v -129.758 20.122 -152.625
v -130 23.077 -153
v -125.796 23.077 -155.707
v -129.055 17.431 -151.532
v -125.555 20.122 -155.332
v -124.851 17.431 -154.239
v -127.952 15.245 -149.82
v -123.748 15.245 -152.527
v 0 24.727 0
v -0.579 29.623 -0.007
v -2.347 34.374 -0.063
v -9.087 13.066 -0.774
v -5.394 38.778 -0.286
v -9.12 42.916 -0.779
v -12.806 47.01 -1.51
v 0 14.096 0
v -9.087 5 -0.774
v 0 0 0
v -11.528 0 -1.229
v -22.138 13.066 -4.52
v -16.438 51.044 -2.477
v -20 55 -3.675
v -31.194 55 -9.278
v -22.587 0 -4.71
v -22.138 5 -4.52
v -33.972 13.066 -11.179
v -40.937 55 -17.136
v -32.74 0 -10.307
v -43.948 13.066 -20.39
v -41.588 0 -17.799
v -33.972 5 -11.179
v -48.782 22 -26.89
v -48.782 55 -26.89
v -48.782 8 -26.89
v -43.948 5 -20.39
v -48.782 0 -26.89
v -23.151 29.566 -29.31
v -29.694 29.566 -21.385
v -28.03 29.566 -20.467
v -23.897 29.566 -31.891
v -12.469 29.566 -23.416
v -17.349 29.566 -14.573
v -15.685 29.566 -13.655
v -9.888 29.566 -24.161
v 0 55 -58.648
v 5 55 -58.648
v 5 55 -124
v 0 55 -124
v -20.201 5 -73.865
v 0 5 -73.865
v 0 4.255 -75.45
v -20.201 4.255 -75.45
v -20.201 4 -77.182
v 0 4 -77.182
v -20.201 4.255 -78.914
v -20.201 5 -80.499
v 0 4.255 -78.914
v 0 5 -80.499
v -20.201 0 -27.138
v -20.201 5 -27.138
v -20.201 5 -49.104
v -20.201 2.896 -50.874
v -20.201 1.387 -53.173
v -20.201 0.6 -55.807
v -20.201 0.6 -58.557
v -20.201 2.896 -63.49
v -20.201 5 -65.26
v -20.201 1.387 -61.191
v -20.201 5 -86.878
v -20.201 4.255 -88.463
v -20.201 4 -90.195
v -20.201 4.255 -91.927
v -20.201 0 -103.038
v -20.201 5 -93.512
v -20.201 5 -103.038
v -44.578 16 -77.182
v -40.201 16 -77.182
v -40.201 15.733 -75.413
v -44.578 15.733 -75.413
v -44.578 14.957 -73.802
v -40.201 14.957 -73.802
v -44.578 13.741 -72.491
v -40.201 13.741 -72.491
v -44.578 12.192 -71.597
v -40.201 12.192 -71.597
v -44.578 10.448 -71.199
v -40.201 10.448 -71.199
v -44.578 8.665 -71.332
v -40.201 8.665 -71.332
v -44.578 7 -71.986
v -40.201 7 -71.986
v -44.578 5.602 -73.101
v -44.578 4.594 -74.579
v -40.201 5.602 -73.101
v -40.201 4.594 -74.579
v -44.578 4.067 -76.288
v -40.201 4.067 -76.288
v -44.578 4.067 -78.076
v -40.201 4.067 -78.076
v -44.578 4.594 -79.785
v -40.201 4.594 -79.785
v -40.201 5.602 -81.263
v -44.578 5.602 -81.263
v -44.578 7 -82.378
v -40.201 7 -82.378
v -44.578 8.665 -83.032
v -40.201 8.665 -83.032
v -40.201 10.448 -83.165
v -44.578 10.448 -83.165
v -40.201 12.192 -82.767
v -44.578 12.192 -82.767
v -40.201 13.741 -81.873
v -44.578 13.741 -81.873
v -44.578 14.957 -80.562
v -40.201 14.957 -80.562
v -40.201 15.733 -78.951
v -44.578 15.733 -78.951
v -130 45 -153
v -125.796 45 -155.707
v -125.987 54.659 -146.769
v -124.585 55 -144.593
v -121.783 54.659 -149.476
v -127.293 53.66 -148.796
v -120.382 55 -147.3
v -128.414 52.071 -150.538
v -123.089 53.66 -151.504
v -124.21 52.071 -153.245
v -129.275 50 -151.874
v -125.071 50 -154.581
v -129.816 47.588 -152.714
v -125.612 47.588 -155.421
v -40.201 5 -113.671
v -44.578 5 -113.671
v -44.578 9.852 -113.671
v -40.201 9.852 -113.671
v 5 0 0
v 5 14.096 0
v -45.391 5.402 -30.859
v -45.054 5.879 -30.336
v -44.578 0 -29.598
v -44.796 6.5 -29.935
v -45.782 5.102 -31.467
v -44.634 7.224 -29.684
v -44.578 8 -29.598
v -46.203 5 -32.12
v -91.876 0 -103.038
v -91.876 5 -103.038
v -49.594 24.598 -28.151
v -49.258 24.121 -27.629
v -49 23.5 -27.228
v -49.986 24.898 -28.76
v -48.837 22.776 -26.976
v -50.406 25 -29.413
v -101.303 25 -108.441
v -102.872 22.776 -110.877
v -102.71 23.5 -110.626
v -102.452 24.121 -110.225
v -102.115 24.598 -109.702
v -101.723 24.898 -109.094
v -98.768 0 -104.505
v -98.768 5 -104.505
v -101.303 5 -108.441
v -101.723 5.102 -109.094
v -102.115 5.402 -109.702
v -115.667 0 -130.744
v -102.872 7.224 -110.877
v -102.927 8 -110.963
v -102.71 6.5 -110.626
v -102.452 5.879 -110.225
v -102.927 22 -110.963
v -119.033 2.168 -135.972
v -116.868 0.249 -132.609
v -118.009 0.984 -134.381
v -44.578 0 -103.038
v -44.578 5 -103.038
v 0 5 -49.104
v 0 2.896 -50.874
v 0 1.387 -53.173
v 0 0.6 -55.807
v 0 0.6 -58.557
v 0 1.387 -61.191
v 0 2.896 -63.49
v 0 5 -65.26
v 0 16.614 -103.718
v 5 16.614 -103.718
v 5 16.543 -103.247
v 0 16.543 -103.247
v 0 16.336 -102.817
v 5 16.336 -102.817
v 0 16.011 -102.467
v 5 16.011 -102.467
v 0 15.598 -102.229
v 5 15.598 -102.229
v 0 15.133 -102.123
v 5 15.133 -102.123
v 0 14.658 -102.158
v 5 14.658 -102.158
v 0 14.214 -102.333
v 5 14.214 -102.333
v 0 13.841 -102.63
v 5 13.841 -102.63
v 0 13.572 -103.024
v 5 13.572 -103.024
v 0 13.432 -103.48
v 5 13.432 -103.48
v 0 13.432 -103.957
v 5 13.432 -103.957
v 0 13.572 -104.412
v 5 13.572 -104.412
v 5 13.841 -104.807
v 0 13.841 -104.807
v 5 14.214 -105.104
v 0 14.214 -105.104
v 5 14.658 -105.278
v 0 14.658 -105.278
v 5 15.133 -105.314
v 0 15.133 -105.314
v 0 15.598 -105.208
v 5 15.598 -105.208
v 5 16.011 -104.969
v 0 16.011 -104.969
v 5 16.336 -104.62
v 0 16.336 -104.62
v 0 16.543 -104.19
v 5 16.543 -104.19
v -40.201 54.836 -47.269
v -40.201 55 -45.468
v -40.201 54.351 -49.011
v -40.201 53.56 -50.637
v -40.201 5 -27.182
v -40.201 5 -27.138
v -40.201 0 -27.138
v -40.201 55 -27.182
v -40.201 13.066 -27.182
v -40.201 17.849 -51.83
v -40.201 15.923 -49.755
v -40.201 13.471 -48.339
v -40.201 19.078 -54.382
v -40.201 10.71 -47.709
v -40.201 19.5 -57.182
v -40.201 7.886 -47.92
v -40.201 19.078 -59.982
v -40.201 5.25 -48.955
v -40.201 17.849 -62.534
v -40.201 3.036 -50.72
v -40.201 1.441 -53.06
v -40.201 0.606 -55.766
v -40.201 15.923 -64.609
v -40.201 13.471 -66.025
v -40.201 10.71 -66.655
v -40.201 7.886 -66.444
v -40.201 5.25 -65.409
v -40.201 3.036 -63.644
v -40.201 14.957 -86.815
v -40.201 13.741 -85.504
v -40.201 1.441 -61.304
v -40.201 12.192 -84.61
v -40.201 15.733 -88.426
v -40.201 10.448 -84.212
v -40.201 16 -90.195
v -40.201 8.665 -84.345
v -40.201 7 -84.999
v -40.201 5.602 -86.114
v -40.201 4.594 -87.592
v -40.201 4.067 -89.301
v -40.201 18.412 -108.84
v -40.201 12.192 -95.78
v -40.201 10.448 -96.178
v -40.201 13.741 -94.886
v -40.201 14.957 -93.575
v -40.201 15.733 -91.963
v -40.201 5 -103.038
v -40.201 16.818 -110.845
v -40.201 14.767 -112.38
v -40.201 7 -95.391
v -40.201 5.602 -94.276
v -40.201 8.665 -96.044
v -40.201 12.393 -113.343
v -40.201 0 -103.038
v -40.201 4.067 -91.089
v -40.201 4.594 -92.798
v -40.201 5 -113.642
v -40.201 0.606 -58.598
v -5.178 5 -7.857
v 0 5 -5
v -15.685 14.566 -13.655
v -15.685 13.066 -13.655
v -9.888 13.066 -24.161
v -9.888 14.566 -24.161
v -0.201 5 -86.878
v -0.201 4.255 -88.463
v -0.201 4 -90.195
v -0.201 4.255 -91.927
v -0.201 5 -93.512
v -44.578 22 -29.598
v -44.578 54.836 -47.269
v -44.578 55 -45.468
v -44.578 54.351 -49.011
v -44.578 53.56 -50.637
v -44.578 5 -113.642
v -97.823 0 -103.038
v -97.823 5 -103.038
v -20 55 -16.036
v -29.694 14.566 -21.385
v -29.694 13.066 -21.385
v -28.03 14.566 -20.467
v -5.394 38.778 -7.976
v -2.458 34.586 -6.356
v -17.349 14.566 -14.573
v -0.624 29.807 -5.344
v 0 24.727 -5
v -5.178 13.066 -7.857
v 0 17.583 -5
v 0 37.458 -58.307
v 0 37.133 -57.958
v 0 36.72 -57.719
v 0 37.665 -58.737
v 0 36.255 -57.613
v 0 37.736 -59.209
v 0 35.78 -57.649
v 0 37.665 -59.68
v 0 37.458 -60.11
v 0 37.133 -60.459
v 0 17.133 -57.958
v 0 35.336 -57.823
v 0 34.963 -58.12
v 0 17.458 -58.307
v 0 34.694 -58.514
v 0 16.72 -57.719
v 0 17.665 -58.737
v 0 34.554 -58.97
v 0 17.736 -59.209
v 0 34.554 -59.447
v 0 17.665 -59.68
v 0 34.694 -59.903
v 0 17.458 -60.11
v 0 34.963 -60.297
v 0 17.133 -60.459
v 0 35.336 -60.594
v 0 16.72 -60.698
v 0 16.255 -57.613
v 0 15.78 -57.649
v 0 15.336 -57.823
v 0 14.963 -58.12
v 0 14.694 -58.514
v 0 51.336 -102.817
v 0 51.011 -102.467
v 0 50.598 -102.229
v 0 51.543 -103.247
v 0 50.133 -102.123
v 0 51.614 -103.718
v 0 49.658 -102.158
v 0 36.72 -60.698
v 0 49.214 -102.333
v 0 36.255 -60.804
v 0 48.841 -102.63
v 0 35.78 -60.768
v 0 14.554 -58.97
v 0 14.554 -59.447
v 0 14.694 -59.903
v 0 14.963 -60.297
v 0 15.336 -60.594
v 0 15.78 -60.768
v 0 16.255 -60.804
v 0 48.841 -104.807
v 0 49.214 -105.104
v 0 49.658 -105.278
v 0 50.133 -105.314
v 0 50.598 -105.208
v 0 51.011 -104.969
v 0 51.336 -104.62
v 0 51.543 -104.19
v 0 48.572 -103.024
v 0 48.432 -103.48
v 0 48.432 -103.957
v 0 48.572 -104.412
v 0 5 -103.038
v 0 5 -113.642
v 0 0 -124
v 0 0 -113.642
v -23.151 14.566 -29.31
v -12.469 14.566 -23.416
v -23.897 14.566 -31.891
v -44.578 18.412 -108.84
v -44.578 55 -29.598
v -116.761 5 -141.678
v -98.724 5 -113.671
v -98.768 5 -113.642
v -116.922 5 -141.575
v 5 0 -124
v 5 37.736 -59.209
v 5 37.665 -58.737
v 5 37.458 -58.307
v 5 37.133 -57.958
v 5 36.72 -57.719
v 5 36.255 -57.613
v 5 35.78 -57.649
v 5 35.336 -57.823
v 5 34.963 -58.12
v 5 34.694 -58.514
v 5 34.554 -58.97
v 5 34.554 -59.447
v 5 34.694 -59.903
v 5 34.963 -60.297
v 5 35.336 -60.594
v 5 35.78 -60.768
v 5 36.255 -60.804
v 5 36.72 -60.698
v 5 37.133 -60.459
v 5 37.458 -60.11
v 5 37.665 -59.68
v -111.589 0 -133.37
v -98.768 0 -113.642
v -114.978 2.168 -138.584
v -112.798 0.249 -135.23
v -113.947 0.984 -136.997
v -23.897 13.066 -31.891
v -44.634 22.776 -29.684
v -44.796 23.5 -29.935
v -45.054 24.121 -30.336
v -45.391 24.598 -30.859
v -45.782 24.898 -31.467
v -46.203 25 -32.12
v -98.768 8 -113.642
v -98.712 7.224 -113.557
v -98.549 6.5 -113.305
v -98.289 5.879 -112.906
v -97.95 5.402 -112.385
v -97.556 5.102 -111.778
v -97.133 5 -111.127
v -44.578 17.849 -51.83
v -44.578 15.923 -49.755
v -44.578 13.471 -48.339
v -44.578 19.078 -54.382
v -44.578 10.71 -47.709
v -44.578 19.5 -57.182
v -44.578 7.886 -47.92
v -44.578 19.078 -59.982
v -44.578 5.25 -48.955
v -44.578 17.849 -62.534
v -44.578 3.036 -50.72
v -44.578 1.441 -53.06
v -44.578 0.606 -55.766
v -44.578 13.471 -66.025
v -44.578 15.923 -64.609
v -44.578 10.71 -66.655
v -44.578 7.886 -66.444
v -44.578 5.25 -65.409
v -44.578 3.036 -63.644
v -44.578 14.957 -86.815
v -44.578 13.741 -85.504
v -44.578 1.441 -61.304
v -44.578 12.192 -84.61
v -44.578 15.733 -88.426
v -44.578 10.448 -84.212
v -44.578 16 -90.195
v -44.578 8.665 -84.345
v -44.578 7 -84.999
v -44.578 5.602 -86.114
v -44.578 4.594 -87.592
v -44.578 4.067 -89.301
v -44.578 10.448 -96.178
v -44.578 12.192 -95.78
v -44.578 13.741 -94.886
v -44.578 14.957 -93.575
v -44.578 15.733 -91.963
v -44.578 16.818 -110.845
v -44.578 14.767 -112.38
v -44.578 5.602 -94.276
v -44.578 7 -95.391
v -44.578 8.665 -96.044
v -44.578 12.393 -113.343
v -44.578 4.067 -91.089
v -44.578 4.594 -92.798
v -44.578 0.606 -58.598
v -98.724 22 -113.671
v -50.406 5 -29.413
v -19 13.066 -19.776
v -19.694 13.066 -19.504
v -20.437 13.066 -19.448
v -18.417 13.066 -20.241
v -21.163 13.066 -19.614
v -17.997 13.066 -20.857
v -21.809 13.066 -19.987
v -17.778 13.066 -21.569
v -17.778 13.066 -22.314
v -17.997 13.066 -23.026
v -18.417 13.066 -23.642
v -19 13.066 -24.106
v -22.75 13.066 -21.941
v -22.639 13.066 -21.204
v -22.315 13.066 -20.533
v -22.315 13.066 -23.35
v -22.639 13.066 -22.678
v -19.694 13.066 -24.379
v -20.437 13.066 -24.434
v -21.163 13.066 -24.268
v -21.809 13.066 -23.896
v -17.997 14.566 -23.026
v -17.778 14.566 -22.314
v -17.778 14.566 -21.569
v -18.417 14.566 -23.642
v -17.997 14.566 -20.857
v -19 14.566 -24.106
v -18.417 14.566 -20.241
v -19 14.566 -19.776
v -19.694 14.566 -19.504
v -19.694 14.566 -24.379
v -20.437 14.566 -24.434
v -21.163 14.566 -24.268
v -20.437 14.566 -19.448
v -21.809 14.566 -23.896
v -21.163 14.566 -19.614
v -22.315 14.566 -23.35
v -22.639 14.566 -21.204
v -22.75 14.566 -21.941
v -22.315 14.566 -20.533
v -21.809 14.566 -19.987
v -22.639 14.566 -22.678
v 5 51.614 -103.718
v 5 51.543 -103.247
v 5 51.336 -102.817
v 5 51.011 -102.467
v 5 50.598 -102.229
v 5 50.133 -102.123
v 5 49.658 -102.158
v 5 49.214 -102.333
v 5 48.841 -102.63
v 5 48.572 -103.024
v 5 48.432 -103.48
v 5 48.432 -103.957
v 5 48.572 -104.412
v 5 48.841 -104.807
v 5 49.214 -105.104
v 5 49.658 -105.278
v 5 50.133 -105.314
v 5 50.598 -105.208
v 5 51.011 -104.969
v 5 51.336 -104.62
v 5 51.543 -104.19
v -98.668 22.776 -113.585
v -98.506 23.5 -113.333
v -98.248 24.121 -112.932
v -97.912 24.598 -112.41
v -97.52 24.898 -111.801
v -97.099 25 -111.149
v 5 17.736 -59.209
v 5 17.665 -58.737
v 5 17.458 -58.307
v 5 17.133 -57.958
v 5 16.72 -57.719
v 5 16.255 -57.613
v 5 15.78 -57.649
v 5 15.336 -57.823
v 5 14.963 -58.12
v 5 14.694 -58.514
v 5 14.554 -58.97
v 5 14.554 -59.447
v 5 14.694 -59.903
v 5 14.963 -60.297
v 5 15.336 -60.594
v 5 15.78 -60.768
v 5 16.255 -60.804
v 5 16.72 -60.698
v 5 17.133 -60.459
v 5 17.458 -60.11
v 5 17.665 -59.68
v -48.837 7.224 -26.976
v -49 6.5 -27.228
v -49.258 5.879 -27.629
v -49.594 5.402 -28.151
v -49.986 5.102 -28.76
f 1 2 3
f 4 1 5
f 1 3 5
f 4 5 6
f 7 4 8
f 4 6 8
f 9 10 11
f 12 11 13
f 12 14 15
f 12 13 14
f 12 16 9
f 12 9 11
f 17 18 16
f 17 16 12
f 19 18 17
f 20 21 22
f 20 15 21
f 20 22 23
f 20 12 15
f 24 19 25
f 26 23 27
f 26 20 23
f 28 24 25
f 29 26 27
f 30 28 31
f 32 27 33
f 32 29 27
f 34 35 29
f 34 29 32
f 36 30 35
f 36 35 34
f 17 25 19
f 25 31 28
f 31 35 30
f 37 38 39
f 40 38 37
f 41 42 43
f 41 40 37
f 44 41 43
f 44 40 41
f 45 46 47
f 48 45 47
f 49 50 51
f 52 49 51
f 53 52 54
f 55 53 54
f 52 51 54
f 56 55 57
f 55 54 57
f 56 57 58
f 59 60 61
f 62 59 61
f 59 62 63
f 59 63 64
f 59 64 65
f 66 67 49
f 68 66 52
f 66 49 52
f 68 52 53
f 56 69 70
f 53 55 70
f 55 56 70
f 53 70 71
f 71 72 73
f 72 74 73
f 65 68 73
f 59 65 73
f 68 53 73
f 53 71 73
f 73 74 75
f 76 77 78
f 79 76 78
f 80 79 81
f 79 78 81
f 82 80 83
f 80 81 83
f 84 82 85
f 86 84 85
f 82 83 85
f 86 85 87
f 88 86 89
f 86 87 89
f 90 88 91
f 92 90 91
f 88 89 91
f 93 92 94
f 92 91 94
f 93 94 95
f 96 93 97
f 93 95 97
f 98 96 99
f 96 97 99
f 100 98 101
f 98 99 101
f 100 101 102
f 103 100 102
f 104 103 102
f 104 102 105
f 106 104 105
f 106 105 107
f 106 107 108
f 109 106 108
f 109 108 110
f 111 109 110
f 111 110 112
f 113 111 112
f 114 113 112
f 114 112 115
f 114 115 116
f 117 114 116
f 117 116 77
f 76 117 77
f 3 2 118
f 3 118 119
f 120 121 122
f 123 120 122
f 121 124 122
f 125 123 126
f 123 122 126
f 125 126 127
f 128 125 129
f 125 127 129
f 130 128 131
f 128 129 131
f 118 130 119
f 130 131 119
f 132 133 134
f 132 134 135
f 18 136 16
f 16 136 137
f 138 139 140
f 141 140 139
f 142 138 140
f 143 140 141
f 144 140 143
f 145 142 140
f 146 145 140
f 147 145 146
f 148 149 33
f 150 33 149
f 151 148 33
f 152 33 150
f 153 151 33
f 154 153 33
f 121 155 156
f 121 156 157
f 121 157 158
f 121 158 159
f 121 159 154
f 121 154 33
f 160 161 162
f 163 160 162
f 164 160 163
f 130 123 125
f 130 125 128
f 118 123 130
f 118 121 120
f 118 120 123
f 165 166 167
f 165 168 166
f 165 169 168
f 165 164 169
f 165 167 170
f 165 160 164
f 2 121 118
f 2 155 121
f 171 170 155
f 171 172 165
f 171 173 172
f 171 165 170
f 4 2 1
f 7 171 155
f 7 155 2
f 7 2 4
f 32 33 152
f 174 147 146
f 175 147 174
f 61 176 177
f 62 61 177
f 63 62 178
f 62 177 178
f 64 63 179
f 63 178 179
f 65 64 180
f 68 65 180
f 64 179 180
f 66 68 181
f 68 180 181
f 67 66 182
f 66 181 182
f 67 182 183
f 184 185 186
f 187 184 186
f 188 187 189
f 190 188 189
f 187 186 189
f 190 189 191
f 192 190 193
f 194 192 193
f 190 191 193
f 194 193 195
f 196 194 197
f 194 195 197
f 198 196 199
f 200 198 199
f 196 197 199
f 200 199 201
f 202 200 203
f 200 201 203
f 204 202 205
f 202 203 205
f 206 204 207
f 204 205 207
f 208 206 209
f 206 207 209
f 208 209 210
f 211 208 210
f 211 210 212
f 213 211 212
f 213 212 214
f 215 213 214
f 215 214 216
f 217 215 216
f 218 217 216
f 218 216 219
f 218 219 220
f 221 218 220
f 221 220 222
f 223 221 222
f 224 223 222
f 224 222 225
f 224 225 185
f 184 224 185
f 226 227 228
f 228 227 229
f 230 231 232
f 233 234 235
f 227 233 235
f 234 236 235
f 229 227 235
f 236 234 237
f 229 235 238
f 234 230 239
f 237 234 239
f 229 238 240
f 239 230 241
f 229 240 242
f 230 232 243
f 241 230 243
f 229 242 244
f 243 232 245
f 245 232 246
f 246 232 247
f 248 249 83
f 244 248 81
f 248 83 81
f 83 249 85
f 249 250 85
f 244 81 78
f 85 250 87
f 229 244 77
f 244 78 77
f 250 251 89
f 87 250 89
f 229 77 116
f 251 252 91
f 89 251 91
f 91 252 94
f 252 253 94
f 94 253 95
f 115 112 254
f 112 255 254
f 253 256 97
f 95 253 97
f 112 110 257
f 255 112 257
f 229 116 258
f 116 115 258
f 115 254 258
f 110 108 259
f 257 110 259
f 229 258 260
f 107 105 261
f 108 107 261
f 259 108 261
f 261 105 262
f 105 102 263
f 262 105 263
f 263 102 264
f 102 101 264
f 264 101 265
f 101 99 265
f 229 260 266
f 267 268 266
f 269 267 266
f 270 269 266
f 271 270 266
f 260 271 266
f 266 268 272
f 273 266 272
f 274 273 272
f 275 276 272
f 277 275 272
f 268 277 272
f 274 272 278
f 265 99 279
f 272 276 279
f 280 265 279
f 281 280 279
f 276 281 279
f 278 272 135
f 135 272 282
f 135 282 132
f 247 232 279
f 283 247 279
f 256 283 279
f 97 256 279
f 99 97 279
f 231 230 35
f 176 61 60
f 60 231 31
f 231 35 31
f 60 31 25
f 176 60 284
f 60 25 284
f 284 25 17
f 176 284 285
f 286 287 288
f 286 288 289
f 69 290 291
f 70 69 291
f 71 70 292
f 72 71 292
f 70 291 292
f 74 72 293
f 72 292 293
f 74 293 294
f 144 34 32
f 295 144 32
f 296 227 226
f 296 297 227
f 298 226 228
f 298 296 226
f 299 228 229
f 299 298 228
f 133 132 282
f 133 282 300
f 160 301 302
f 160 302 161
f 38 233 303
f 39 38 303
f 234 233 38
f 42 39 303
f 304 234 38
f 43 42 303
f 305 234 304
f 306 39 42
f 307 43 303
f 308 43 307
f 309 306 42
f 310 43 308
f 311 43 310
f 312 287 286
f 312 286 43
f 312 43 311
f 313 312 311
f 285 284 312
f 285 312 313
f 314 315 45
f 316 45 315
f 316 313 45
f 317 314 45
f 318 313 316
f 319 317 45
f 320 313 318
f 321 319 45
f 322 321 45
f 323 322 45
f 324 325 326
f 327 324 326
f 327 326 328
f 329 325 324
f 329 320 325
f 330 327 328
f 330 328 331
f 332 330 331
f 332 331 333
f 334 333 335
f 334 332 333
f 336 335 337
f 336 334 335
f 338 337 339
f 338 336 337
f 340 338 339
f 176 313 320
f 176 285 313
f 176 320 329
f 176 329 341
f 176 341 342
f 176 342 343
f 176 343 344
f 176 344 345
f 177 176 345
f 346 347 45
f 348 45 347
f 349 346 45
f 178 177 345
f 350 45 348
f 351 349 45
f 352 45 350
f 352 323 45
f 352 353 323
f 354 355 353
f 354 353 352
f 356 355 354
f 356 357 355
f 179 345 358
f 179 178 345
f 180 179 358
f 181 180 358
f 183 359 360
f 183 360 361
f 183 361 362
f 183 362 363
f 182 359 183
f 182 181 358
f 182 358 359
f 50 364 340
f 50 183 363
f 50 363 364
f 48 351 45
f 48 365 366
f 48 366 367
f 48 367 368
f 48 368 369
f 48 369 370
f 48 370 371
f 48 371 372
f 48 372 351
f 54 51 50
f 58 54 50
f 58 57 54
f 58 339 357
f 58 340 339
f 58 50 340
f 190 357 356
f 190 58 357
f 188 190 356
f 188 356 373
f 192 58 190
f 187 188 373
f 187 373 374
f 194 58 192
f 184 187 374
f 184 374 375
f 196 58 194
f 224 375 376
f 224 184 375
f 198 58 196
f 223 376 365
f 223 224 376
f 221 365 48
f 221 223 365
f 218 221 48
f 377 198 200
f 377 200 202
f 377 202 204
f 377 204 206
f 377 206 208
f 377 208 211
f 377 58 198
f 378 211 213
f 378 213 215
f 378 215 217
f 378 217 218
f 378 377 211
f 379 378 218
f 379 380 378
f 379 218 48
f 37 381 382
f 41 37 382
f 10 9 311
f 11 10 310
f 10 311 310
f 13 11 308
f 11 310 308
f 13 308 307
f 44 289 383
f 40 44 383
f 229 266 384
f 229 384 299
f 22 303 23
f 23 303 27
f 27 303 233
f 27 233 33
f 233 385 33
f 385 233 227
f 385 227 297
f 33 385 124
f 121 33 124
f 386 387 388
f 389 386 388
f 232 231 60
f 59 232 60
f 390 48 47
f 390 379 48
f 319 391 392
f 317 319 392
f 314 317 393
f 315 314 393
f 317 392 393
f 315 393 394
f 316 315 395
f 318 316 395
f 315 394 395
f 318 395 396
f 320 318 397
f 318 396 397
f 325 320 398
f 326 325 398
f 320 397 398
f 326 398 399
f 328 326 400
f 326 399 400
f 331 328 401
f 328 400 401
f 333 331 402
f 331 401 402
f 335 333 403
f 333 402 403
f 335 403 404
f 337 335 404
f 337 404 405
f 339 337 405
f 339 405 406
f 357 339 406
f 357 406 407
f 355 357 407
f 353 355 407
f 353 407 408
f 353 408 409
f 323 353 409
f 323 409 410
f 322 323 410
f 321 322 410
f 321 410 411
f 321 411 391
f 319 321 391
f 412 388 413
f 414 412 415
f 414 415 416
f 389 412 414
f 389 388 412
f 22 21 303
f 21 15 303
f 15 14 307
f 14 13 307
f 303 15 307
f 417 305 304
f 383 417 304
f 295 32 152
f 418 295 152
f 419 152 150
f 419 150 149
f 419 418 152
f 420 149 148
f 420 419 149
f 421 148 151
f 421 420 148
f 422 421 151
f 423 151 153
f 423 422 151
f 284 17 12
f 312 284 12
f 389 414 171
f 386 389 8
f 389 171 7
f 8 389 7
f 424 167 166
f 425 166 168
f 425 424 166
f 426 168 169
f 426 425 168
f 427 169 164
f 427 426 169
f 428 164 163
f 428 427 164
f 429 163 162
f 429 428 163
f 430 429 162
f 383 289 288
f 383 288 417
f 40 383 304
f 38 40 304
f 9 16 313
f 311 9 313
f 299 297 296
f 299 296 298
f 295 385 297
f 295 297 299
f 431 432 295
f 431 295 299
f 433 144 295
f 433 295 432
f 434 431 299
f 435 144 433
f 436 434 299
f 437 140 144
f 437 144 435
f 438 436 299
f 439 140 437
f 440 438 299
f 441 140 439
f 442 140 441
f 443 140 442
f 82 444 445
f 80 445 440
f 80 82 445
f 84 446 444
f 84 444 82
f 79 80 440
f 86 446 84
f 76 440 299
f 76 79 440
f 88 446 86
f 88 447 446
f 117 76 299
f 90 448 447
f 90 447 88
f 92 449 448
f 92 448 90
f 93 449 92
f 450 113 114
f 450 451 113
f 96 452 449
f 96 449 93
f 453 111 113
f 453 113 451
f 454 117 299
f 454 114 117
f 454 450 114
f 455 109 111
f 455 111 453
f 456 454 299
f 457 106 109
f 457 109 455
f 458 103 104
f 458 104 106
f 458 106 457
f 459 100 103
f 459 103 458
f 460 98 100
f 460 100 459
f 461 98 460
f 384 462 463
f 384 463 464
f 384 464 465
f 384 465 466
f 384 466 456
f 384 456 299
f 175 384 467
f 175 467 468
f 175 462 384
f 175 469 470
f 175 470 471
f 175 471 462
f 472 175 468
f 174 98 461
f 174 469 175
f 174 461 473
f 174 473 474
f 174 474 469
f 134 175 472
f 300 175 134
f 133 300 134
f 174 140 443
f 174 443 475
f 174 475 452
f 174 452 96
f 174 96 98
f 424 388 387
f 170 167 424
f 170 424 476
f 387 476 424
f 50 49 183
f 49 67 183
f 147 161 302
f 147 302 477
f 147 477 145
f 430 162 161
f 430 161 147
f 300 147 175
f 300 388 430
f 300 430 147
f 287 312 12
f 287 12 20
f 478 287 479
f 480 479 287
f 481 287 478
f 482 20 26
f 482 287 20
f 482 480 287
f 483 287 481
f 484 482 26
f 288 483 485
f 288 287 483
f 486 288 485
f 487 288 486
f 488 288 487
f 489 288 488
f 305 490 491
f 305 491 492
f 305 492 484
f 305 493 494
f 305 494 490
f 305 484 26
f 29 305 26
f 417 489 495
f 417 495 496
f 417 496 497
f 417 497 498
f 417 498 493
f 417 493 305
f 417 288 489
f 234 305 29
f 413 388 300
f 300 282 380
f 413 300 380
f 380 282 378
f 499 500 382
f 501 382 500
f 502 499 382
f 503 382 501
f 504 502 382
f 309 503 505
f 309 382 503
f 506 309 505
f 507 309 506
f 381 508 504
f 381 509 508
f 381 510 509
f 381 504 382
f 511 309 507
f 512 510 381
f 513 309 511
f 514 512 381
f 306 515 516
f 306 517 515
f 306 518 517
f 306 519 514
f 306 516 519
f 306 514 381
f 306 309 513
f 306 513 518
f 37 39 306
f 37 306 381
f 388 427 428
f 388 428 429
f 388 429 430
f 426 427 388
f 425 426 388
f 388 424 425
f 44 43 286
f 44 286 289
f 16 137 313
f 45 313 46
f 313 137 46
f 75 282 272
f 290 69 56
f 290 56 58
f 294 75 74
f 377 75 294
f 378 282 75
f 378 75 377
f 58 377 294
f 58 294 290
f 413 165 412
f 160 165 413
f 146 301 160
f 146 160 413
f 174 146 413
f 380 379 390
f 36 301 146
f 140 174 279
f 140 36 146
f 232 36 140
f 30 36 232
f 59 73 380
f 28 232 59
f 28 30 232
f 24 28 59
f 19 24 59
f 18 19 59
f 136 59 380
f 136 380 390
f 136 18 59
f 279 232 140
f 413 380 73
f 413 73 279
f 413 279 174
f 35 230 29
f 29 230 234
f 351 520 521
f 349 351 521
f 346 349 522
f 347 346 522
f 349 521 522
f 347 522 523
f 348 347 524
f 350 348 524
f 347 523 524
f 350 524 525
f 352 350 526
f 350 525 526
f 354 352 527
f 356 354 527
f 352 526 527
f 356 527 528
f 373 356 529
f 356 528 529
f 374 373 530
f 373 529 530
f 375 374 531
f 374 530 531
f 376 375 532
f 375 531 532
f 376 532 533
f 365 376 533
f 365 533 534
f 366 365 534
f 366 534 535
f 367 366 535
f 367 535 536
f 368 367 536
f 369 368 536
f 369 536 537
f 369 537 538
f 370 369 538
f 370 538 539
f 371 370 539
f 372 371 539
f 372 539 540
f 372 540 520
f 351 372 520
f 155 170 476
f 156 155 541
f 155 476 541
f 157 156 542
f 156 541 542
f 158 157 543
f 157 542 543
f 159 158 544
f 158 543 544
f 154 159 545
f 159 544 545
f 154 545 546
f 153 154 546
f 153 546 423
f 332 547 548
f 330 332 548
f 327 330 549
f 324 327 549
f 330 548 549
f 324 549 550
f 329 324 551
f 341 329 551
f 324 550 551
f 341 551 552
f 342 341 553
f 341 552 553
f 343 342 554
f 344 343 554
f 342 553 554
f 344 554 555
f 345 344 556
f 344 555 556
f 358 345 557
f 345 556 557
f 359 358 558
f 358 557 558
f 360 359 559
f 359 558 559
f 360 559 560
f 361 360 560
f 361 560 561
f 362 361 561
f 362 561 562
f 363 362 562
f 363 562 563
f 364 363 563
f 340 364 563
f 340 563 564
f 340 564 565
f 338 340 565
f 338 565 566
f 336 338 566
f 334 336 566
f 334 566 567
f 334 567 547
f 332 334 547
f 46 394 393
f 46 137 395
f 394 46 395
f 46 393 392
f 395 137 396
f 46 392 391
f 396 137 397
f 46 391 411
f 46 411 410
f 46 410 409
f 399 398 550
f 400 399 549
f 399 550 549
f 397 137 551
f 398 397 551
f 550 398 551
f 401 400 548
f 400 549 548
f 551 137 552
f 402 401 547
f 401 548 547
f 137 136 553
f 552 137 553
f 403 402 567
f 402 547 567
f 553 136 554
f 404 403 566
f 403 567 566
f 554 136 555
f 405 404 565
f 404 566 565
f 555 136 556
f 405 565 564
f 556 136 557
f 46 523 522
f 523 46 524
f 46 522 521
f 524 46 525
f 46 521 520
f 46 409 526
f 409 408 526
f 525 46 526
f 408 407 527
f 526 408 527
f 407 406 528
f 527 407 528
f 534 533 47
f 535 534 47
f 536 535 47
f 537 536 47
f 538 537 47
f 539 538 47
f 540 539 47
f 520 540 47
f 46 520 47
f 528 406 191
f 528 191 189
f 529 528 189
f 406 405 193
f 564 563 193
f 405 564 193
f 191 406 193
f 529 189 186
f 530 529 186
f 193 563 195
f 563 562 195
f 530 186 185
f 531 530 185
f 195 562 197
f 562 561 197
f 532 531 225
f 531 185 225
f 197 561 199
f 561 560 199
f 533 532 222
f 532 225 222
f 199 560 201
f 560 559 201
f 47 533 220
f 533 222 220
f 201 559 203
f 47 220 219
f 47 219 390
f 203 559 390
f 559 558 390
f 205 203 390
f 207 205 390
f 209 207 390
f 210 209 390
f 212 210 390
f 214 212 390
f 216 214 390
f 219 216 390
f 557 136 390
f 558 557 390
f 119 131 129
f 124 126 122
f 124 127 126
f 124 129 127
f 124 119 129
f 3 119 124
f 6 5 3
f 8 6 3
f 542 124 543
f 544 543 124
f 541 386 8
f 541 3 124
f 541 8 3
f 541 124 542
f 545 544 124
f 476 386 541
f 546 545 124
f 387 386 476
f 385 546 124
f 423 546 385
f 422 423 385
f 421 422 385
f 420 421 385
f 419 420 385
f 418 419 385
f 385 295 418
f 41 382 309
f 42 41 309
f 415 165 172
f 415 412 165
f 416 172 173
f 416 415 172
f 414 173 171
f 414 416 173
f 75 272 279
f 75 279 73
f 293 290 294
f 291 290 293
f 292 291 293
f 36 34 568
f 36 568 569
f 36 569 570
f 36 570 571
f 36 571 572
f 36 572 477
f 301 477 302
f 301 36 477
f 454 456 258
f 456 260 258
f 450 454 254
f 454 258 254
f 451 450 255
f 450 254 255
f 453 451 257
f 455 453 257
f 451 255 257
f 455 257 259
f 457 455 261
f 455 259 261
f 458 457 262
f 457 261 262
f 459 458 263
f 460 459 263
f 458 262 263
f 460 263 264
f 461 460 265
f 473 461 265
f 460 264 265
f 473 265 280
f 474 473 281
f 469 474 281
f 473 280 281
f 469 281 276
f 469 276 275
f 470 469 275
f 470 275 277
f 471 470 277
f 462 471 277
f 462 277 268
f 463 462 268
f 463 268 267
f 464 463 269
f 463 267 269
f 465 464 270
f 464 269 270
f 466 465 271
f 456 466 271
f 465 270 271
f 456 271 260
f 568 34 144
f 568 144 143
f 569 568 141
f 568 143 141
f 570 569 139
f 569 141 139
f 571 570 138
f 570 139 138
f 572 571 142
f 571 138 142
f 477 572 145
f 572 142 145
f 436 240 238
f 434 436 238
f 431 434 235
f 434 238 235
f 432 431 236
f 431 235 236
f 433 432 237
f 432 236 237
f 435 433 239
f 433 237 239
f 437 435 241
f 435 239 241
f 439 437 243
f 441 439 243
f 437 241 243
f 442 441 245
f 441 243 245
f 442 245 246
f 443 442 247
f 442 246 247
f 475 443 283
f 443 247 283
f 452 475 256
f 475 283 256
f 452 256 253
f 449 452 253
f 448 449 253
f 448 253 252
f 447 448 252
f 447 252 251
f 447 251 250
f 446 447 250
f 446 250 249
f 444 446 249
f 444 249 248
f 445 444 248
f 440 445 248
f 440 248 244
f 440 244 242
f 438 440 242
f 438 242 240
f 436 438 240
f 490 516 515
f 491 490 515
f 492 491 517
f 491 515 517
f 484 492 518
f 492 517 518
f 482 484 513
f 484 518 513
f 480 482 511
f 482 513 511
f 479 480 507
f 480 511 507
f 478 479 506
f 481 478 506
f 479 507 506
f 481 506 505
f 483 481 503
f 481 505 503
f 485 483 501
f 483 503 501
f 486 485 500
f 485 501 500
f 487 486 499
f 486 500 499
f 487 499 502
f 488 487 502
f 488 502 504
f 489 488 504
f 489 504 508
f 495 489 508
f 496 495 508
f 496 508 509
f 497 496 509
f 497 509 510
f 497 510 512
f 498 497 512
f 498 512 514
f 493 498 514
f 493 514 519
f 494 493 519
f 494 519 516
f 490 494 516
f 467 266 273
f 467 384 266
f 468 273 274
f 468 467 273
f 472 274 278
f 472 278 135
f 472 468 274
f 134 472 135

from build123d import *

# Parameters (mm, degrees)
SKETCH1_W            = 155
SKETCH1_H            = 5
BOSS_EXTRUDE2_DEPTH  = 55
SKETCH2_W            = 112
SKETCH2_H            = 45
SKETCH2_R            = 1.75
CUT_EXTRUDE1_DEPTH   = 55
SKETCH3_W            = 100
SKETCH3_H            = 20
CUT_EXTRUDE2_DEPTH   = 55
SKETCH4_W            = 40
SKETCH4_H            = 8.065867699
CUT_EXTRUDE3_DEPTH   = 55
BOSS_EXTRUDE4_DEPTH  = 5
CUT_EXTRUDE4_DEPTH   = 50
SKETCH9_W            = 4.377781836
SKETCH9_H            = 86.488706471
BOSS_EXTRUDE7_DEPTH  = 50
SKETCH10_W           = 20
SKETCH10_H           = 86.532324722
CUT_EXTRUDE5_DEPTH   = 10
SKETCH12_R           = 9.5
SKETCH12_R_2         = 6
CUT_EXTRUDE6_DEPTH   = 10
CUT_EXTRUDE7_START   = 50
SKETCH13_R           = 9.5
SKETCH13_R_2         = 6
CUT_EXTRUDE7_DEPTH   = 50
CUT_EXTRUDE8_DEPTH   = 50
CUT_EXTRUDE9_DEPTH   = 50
CUT_EXTRUDE10_DEPTH  = 10
FILLET5_R            = 3
SKETCH18_W           = 98.767816147
SKETCH18_H           = 10.604205858
BOSS_EXTRUDE8_DEPTH  = 5
CUT_EXTRUDE11_DEPTH  = 5
SKETCH20_W           = 155
SKETCH20_H           = 119
BOSS_EXTRUDE9_DEPTH  = 10
CUT_EXTRUDE13_DEPTH  = 155
SKETCH24_W           = 125
SKETCH24_H           = 8
BOSS_EXTRUDE10_DEPTH = 95
FILLET6_R            = 20
SKETCH26_W           = 16
SKETCH26_H           = 1.5
BOSS_EXTRUDE11_DEPTH = 12
BOSS_EXTRUDE12_DEPTH = 15
SKETCH28_R           = 2.5
CUT_EXTRUDE15_DEPTH  = 5
CUT_EXTRUDE17_DEPTH  = 35
SKETCH29_W           = 43
SKETCH29_H           = 43
CUT_EXTRUDE18_DEPTH  = 35
FILLET9_R            = 10
SKETCH31_W           = 124
SKETCH31_H           = 12
BOSS_EXTRUDE14_DEPTH = 2
SKETCH32_W           = 5
SKETCH32_H           = 2
BOSS_EXTRUDE15_DEPTH = 132
SKETCH33_W           = 20
SKETCH33_H           = 12
CUT_EXTRUDE19_DEPTH  = 160
SKETCH34_W           = 2
SKETCH34_H           = 12
BOSS_EXTRUDE17_DEPTH = 123
SKETCH36_R           = 6
CUT_EXTRUDE20_DEPTH  = 40
CUT_EXTRUDE21_DEPTH  = 25
SKETCH39_W           = 10
SKETCH39_H           = 12
CUT_EXTRUDE22_DEPTH  = 165
SKETCH40_W           = 2
SKETCH40_H           = 12
BOSS_EXTRUDE18_DEPTH = 115
BOSS_EXTRUDE20_REACH = 223.912
SKETCH42_W           = 5
SKETCH42_H           = 124
SKETCH45_R           = 1.6
CUT_EXTRUDE23_DEPTH  = 30
BOSS_EXTRUDE22_DEPTH = 120
SKETCH52_W           = 2
SKETCH52_H           = 14.095569493
BOSS_EXTRUDE23_DEPTH = 120
CUT_EXTRUDE26_DEPTH  = 5
FILLET14_R           = 10
FILLET15_R           = 5
FILLET16_R           = 5
FILLET17_R           = 5
FILLET18_R           = 1
SKETCH55_W           = 143.69990308
SKETCH55_H           = 184.016268103
CUT_EXTRUDE27_DEPTH  = 224.986052647
CHAMFER2_SIZE        = 20
CHAMFER2_SIZE2       = 22.212250297
FILLET19_R           = 21
SKETCH58_W           = 176.64337682
SKETCH58_H           = 51.948423731
CUT_EXTRUDE30_DEPTH  = 30


with BuildPart() as part:
    # Sketch1 → Boss-Extrude2 (new body)
    with BuildSketch(Plane(origin=(0, 0, 0), x_dir=(1, 0, 0), z_dir=(0, 1, 0))):
        Polygon((-44.578450817, 29.59757322), (-48.782107146, 26.890310125), (-130, 153), (-125.796343671, 155.707263095), align=None)
        with BuildLine():
            ThreePointArc((0, 0), (-27.802696096, 7.256044178), (-48.782107146, 26.890310125))
            Line((-48.782107146, 26.890310125), (-44.578450817, 29.59757322))
            Line((-44.578450817, 29.59757322), (0, 5))
            Line((0, 5), (0, 0))
        make_face()
        with Locations((77.5, 2.5)):
            Rectangle(SKETCH1_W, SKETCH1_H)
    extrude(amount=BOSS_EXTRUDE2_DEPTH)

    # Sketch2 → Cut-Extrude1 (cut)
    with BuildSketch(Plane.XY):
        with Locations((99, 32.5)):
            Rectangle(SKETCH2_W, SKETCH2_H)
        with Locations((5, 25)):
            Circle(SKETCH2_R)
        with Locations((5, 50)):
            Circle(SKETCH2_R)
        with Locations((35, 50)):
            Circle(SKETCH2_R)
        with Locations((35, 25)):
            Circle(SKETCH2_R)
    extrude(amount=-CUT_EXTRUDE1_DEPTH, mode=Mode.SUBTRACT)

    # Sketch3 → Cut-Extrude2 (cut)
    with BuildSketch(Plane(origin=(-22.239707671, 0, 14.322945338), x_dir=(0.5414526190246729, 0, 0.840731265834287), z_dir=(-0.8407312658342869, 0, 0.5414526190246728))):
        with Locations((-99.020724146, 15)):
            Rectangle(SKETCH3_W, SKETCH3_H)
    extrude(amount=-CUT_EXTRUDE2_DEPTH, mode=Mode.SUBTRACT)

    # Sketch4 → Cut-Extrude3 (cut)
    with BuildSketch(Plane(origin=(2.114976352, 0, -3.832994761), x_dir=(-0.8755563671808256, 0, -0.48311597767939257), z_dir=(0.48311597767939257, 0, -0.8755563671808256))):
        with Locations((28.330006975, 9.03293385)):
            Rectangle(SKETCH4_W, SKETCH4_H)
    extrude(amount=-CUT_EXTRUDE3_DEPTH, mode=Mode.SUBTRACT)

    # Sketch5 → Boss-Extrude4 (add)
    with BuildSketch(Plane.XZ):
        Polygon((0, -5), (-44.578450817, -29.59757322), (-125.796343671, -155.707263095), (0, -155.707263095), align=None)
    extrude(amount=-BOSS_EXTRUDE4_DEPTH)

    # Sketch8 → Cut-Extrude4 (cut)
    with BuildSketch(Plane(origin=(0, 5, 0), x_dir=(1, 0, 0), z_dir=(0, 1, 0))):
        Polygon((-44.578450817, 29.59757322), (-98.72371272, 113.670699803), (-44.578450817, 113.670699803), align=None)
    extrude(amount=-CUT_EXTRUDE4_DEPTH, mode=Mode.SUBTRACT)

    # Sketch9 → Boss-Extrude7 (add)
    with BuildSketch(Plane(origin=(0, 5, 0), x_dir=(1, 0, 0), z_dir=(0, 1, 0))):
        with Locations((-42.389559899, 70.426346568)):
            Rectangle(SKETCH9_W, SKETCH9_H)
    extrude(amount=BOSS_EXTRUDE7_DEPTH)

    # Sketch10 → Cut-Extrude5 (cut)
    with BuildSketch(Plane(origin=(0, 5, 0), x_dir=(1, 0, 0), z_dir=(0, 1, 0))):
        with Locations((-30.200668981, 70.404537442)):
            Rectangle(SKETCH10_W, SKETCH10_H)
    extrude(amount=-CUT_EXTRUDE5_DEPTH, mode=Mode.SUBTRACT)

    # Sketch12 → Cut-Extrude6 (cut)
    with BuildSketch(Plane(origin=(-40.200668981, 0, 0), x_dir=(0, 0, -1), z_dir=(1, 0, 0))):
        with Locations(Location((57.181993332, 10, 0), (0, 0, 90))):
            Circle(SKETCH12_R)
        with Locations(Location((77.181993332, 10, 0), (0, 0, 90))):
            Circle(SKETCH12_R_2)
    extrude(amount=-CUT_EXTRUDE6_DEPTH, mode=Mode.SUBTRACT)

    # Sketch13 → Cut-Extrude7 (cut)
    with BuildSketch(Plane(origin=(-40.200668981, 0, 0), x_dir=(0, 0, -1), z_dir=(1, 0, 0)).offset(CUT_EXTRUDE7_START)):
        with Locations(Location((57.181993332, 10, 0), (0, 0, 90))):
            Circle(SKETCH13_R)
        with Locations(Location((77.181993332, 10, 0), (0, 0, 90))):
            Circle(SKETCH13_R_2)
    extrude(amount=-CUT_EXTRUDE7_DEPTH, mode=Mode.SUBTRACT)

    # Sketch14 → Cut-Extrude8 (cut)
    with BuildSketch(Plane(origin=(0, 5, 0), x_dir=(1, 0, 0), z_dir=(0, 1, 0))):
        Polygon((0, 103.038090201), (-91.876037903, 103.038090201), (-126.106254173, 155.707263095), (0, 155.707263095), align=None)
    extrude(amount=-CUT_EXTRUDE8_DEPTH, mode=Mode.SUBTRACT)

    # Sketch15 → Cut-Extrude9 (cut)
    with BuildSketch(Plane(origin=(-22.239707671, 0, 14.322945338), x_dir=(0.5414526190246729, 0, 0.840731265834287), z_dir=(-0.8407312658342869, 0, 0.5414526190246728))):
        Polygon((-176.035909688, 0), (-199.020724146, 18.247450711), (-199.020724146, 0), align=None)
    extrude(amount=-CUT_EXTRUDE9_DEPTH, mode=Mode.SUBTRACT)

    # Sketch16 → Cut-Extrude10 (cut)
    with BuildSketch(Plane(origin=(-40.200668981, 0, 0), x_dir=(0, 0, -1), z_dir=(1, 0, 0))):
        Polygon((113.670699803, 15.495236251), (48.252901996, 55), (113.670699803, 55), align=None)
    extrude(amount=-CUT_EXTRUDE10_DEPTH, mode=Mode.SUBTRACT)

    # Fillet5
    fillet5_edges = [part.edges().sort_by_distance(p)[0] for p in [
        (-100.847592598, 5, -112.302866383),
        (-46.680278982, 25, -28.243941672),
        (-46.680278982, 5, -28.243941672),
        (-100.825540884, 25, -112.317068256),
    ]]
    fillet(fillet5_edges, radius=FILLET5_R)

    # Sketch18 → Boss-Extrude8 (add)
    with BuildSketch(Plane(origin=(0, 5, 0), x_dir=(1, 0, 0), z_dir=(0, 1, 0))):
        with Locations((-49.383908074, 108.34019313)):
            Rectangle(SKETCH18_W, SKETCH18_H)
    extrude(amount=-BOSS_EXTRUDE8_DEPTH)

    # Sketch19 → Cut-Extrude11 (cut)
    with BuildSketch(Plane.XZ):
        Polygon((-97.82324149, -103.038090201), (-98.767816147, -104.504762295), (-98.767816147, -103.038090201), align=None)
    extrude(amount=-CUT_EXTRUDE11_DEPTH, mode=Mode.SUBTRACT)

    # Sketch20 → Boss-Extrude9 (add)
    with BuildSketch(Plane.XZ):
        with Locations((77.5, -64.5)):
            Rectangle(SKETCH20_W, SKETCH20_H)
    extrude(amount=-BOSS_EXTRUDE9_DEPTH)

    # Sketch21 → Cut-Extrude13 (cut)
    with BuildSketch(Plane(origin=(155, 0, 0), x_dir=(0, 0, -1), z_dir=(1, 0, 0))):
        Polygon((5, 10), (124, 10), (124, 7), align=None)
    extrude(amount=-CUT_EXTRUDE13_DEPTH, mode=Mode.SUBTRACT)

    # Sketch24 → Boss-Extrude10 (add)
    with BuildSketch(Plane.XZ):
        with Locations((62.5, -120)):
            Rectangle(SKETCH24_W, SKETCH24_H)
    extrude(amount=-BOSS_EXTRUDE10_DEPTH)

    # Fillet6
    fillet6_edges = [part.edges().sort_by_distance(p)[0] for p in [
        (62.5, 7.201680672, -116),
    ]]
    fillet(fillet6_edges, radius=FILLET6_R)

    # Sketch26 → Boss-Extrude11 (add)
    with BuildSketch(Plane(origin=(2.114976352, 0, -3.832994761), x_dir=(-0.8755563671808256, 0, -0.48311597767939257), z_dir=(0.48311597767939257, 0, -0.8755563671808256))):
        with Locations((28.330006975, 13.815867699)):
            Rectangle(SKETCH26_W, SKETCH26_H)
    extrude(amount=BOSS_EXTRUDE11_DEPTH)

    # Sketch27 → Boss-Extrude12 (add)
    with BuildSketch(Plane(origin=(0, 14.565867699, 0), x_dir=(1, 0, 0), z_dir=(0, 1, 0))):
        Polygon((-15.6850907, 13.654745957), (-9.887698968, 24.161422363), (-23.896600843, 31.891278006), (-29.693992575, 21.384601599), (-28.030435477, 20.466681242), (-23.150964103, 29.30980055), (-12.469176423, 23.415785623), (-17.348647798, 14.572666314), align=None)
    extrude(amount=BOSS_EXTRUDE12_DEPTH)

    # Sketch28 → Cut-Extrude15 (cut)
    with BuildSketch(Plane(origin=(0, 14.565867699, 0), x_dir=(1, 0, 0), z_dir=(0, 1, 0))):
        with Locations(Location((-20.24980595, 21.941233432, 0), (0, 0, 180))):
            Circle(SKETCH28_R)
    extrude(amount=-CUT_EXTRUDE15_DEPTH, mode=Mode.SUBTRACT)

    # Sketch25 → Cut-Extrude17 (cut)
    with BuildSketch(Plane(origin=(0, 0, -124), x_dir=(-1, 0, 0), z_dir=(0, 0, -1))):
        with BuildLine():
            Line((-36.75, 77), (-36.75, 72))
            ThreePointArc((-36.75, 72), (-35, 70.25), (-33.25, 72))
            Line((-33.25, 72), (-33.25, 77))
            ThreePointArc((-33.25, 77), (-35, 78.75), (-36.75, 77))
        make_face()
        with BuildLine():
            Line((-73.25, 77), (-73.25, 72))
            ThreePointArc((-73.25, 72), (-75, 70.25), (-76.75, 72))
            Line((-76.75, 72), (-76.75, 77))
            ThreePointArc((-76.75, 77), (-75, 78.75), (-73.25, 77))
        make_face()
    extrude(amount=-CUT_EXTRUDE17_DEPTH, mode=Mode.SUBTRACT)

    # Sketch29 → Cut-Extrude18 (cut)
    with BuildSketch(Plane.XY):
        with Locations((21.5, 33.5)):
            Rectangle(SKETCH29_W, SKETCH29_H)
    extrude(amount=-CUT_EXTRUDE18_DEPTH, mode=Mode.SUBTRACT)

    # Fillet9
    fillet9_edges = [part.edges().sort_by_distance(p)[0] for p in [
        (-115.522140631, 0, -134.985040643),
        (-127.898171835, 18.247450711, -154.353631548),
        (-42.389559899, 15.495236251, -113.670699803),
        (-42.389559899, 55, -48.252901996),
        (-127.898171835, 55, -154.353631548),
    ]]
    fillet(fillet9_edges, radius=FILLET9_R)

    # Sketch31 → Boss-Extrude14 (add)
    with BuildSketch(Plane(origin=(155, 0, 0), x_dir=(0, 0, -1), z_dir=(1, 0, 0))):
        with Locations((62, 6)):
            Rectangle(SKETCH31_W, SKETCH31_H)
    extrude(amount=-BOSS_EXTRUDE14_DEPTH)

    # Sketch32 → Boss-Extrude15 (add)
    with BuildSketch(Plane.ZY.offset(-153)):
        with Locations((-2.5, 11)):
            Rectangle(SKETCH32_W, SKETCH32_H)
    extrude(amount=BOSS_EXTRUDE15_DEPTH)

    # Sketch33 → Cut-Extrude19 (cut)
    with BuildSketch(Plane.XY):
        with Locations((145, 6)):
            Rectangle(SKETCH33_W, SKETCH33_H)
    extrude(amount=-CUT_EXTRUDE19_DEPTH, mode=Mode.SUBTRACT)

    # Sketch34 → Boss-Extrude17 (add)
    with BuildSketch(Plane.XY):
        with Locations((134, 6)):
            Rectangle(SKETCH34_W, SKETCH34_H)
    extrude(amount=-BOSS_EXTRUDE17_DEPTH)

    # Sketch36 → Cut-Extrude20 (cut, symmetric)
    with BuildSketch(Plane(origin=(-40.200668981, 0, 0), x_dir=(0, 0, -1), z_dir=(1, 0, 0))):
        with Locations(Location((90.194878088, 10, 0), (0, 0, 90))):
            Circle(SKETCH36_R)
    extrude(amount=CUT_EXTRUDE20_DEPTH, both=True, mode=Mode.SUBTRACT)

    # Sketch38 → Cut-Extrude21 (cut)
    with BuildSketch(Plane(origin=(125, 0, 0), x_dir=(0, 0, -1), z_dir=(1, 0, 0))):
        Polygon((95.495958465, 7.718589282), (124, 7), (124, 95), (116, 95), align=None)
    extrude(amount=-CUT_EXTRUDE21_DEPTH, mode=Mode.SUBTRACT)

    # Sketch39 → Cut-Extrude22 (cut)
    with BuildSketch(Plane.XY):
        with Locations((130, 6)):
            Rectangle(SKETCH39_W, SKETCH39_H)
    extrude(amount=-CUT_EXTRUDE22_DEPTH, mode=Mode.SUBTRACT)

    # Sketch40 → Boss-Extrude18 (add)
    with BuildSketch(Plane.XY):
        with Locations((124, 6)):
            Rectangle(SKETCH40_W, SKETCH40_H)
    extrude(amount=-BOSS_EXTRUDE18_DEPTH)

    # Boss-Extrude20: up to this face of the body (flat: up to its plane)
    boss_extrude20_end = Plane(part.part.faces().sort_by_distance((50, 95, -120))[0])
    # Sketch42 → Boss-Extrude20 (add, up to the picked face)
    with BuildSketch(Plane(origin=(0, 5, 0), x_dir=(1, 0, 0), z_dir=(0, 1, 0)), mode=Mode.PRIVATE) as boss_extrude20_sk1:
        with Locations((2.5, 62)):
            Rectangle(SKETCH42_W, SKETCH42_H)
    boss_extrude20_tool1 = split(extrude(boss_extrude20_sk1.sketch, amount=BOSS_EXTRUDE20_REACH, mode=Mode.PRIVATE), bisect_by=boss_extrude20_end, keep=Keep.BOTH, mode=Mode.PRIVATE)
    add(boss_extrude20_tool1.solids().sort_by(Axis((2.5, 5, -62), (0, 1, 0)))[0])

    # Sketch45 → Cut-Extrude23 (cut)
    with BuildSketch(Plane(origin=(5, 0, 0), x_dir=(0, 0, -1), z_dir=(1, 0, 0))):
        with Locations(Location((59.208509529, 36.135781847, 0), (0, 0, 90))):
            Circle(SKETCH45_R)
        with Locations(Location((59.208509529, 16.135781847, 0), (0, 0, 90))):
            Circle(SKETCH45_R)
        with Locations(Location((103.718271361, 50.013687011, 0), (0, 0, 90))):
            Circle(SKETCH45_R)
        with Locations(Location((103.718271361, 15.013687011, 0), (0, 0, 90))):
            Circle(SKETCH45_R)
    extrude(amount=-CUT_EXTRUDE23_DEPTH, mode=Mode.SUBTRACT)

    # Sketch51 → Boss-Extrude22 (add)
    with BuildSketch(Plane(origin=(125, 0, 0), x_dir=(0, 0, -1), z_dir=(1, 0, 0))):
        Polygon((124, 7), (5, 12), (5, 14.095569493), (0, 14.095569493), (0, 7.113445378), align=None)
    extrude(amount=-BOSS_EXTRUDE22_DEPTH)

    # Sketch52 → Boss-Extrude23 (add)
    with BuildSketch(Plane.XY):
        with Locations((124, 7.047784747)):
            Rectangle(SKETCH52_W, SKETCH52_H)
    extrude(amount=-BOSS_EXTRUDE23_DEPTH)

    # Sketch54 → Cut-Extrude26 (cut)
    with BuildSketch(Plane(origin=(5, 0, 0), x_dir=(0, 0, -1), z_dir=(1, 0, 0))):
        Polygon((0, 14.095569493), (116, 95), (0, 95), align=None)
    extrude(amount=-CUT_EXTRUDE26_DEPTH, mode=Mode.SUBTRACT)

    # Fillet14
    fillet14_edges = [part.edges().sort_by_distance(p)[0] for p in [
        (100, 7.513892889, -111.769349239),
    ]]
    fillet(fillet14_edges, radius=FILLET14_R)

    # Fillet15
    fillet15_edges = [part.edges().sort_by_distance(p)[0] for p in [
        (124, 14.095569493, -120),
    ]]
    fillet(fillet15_edges, radius=FILLET15_R)

    # Fillet16
    # the kernel refuses this fillet: 5 mm, written as the material it adds along each edge
    with BuildSketch(Plane(origin=(123, 7.168067227, -120), x_dir=(0, 0.9980473315851939, 0.062462179882501946), z_dir=(1, 0, 0))) as fillet16_piece_1:
        with BuildLine():
            CenterArc((4.502899102, -4.869840665), FILLET16_R, 103.101980319, 66.66628485)
            Line((-0.417587767, -3.981691481), (-0.909636454, -3.892876563))
            ThreePointArc((-0.909636454, -3.892876563), (-0.706066567, -1.938693285), (-0.497272683, 0.052152456))
            Line((-0.497272683, 0.052152456), (0.03123109, 0.499023666))
            ThreePointArc((0.03123109, 0.499023666), (1.954969583, 0.378627673), (3.256131762, 0.486984066))
            Line((3.256131762, 0.486984066), (3.369474248, 0))
        make_face()
    extrude(amount=2)

    # Fillet17
    fillet17_edges = [part.edges().sort_by_distance(p)[0] for p in [
        (100, 95, -120),
    ]]
    fillet(fillet17_edges, radius=FILLET17_R)

    # Fillet18
    fillet18_edges = [part.edges().sort_by_distance(p)[0] for p in [
        (5, 10.013892889, -52.269349239),
    ]]
    fillet(fillet18_edges, radius=FILLET18_R)

    # Sketch55 → Cut-Extrude27 (cut, through all)
    with BuildSketch(Plane.XY):
        with Locations((76.84995154, 92.008134052)):
            Rectangle(SKETCH55_W, SKETCH55_H)
    extrude(amount=-CUT_EXTRUDE27_DEPTH, mode=Mode.SUBTRACT)

    # Chamfer2
    chamfer2_edges = [part.edges().sort_by_distance(p)[0] for p in [
        (0, 55, -2.5),
    ]]
    chamfer2_side = [part.faces().sort_by_distance(p)[0] for p in [
        (-42.129886846, 55, -36.324850438),
    ]]
    chamfer(chamfer2_edges, length=CHAMFER2_SIZE, length2=CHAMFER2_SIZE2, reference=chamfer2_side[0])

    # Fillet19
    fillet19_edges = [part.edges().sort_by_distance(p)[0] for p in [
        (0, 32.787749703, -2.5),
    ]]
    fillet(fillet19_edges, radius=FILLET19_R)

    # Sketch58 → Cut-Extrude30 (cut)
    with BuildSketch(Plane(origin=(5, 0, 0), x_dir=(0, 0, -1), z_dir=(1, 0, 0))):
        with Locations((62.367890206, 80.974211865)):
            Rectangle(SKETCH58_W, SKETCH58_H)
    extrude(amount=-CUT_EXTRUDE30_DEPTH, mode=Mode.SUBTRACT)


solid = part.part
